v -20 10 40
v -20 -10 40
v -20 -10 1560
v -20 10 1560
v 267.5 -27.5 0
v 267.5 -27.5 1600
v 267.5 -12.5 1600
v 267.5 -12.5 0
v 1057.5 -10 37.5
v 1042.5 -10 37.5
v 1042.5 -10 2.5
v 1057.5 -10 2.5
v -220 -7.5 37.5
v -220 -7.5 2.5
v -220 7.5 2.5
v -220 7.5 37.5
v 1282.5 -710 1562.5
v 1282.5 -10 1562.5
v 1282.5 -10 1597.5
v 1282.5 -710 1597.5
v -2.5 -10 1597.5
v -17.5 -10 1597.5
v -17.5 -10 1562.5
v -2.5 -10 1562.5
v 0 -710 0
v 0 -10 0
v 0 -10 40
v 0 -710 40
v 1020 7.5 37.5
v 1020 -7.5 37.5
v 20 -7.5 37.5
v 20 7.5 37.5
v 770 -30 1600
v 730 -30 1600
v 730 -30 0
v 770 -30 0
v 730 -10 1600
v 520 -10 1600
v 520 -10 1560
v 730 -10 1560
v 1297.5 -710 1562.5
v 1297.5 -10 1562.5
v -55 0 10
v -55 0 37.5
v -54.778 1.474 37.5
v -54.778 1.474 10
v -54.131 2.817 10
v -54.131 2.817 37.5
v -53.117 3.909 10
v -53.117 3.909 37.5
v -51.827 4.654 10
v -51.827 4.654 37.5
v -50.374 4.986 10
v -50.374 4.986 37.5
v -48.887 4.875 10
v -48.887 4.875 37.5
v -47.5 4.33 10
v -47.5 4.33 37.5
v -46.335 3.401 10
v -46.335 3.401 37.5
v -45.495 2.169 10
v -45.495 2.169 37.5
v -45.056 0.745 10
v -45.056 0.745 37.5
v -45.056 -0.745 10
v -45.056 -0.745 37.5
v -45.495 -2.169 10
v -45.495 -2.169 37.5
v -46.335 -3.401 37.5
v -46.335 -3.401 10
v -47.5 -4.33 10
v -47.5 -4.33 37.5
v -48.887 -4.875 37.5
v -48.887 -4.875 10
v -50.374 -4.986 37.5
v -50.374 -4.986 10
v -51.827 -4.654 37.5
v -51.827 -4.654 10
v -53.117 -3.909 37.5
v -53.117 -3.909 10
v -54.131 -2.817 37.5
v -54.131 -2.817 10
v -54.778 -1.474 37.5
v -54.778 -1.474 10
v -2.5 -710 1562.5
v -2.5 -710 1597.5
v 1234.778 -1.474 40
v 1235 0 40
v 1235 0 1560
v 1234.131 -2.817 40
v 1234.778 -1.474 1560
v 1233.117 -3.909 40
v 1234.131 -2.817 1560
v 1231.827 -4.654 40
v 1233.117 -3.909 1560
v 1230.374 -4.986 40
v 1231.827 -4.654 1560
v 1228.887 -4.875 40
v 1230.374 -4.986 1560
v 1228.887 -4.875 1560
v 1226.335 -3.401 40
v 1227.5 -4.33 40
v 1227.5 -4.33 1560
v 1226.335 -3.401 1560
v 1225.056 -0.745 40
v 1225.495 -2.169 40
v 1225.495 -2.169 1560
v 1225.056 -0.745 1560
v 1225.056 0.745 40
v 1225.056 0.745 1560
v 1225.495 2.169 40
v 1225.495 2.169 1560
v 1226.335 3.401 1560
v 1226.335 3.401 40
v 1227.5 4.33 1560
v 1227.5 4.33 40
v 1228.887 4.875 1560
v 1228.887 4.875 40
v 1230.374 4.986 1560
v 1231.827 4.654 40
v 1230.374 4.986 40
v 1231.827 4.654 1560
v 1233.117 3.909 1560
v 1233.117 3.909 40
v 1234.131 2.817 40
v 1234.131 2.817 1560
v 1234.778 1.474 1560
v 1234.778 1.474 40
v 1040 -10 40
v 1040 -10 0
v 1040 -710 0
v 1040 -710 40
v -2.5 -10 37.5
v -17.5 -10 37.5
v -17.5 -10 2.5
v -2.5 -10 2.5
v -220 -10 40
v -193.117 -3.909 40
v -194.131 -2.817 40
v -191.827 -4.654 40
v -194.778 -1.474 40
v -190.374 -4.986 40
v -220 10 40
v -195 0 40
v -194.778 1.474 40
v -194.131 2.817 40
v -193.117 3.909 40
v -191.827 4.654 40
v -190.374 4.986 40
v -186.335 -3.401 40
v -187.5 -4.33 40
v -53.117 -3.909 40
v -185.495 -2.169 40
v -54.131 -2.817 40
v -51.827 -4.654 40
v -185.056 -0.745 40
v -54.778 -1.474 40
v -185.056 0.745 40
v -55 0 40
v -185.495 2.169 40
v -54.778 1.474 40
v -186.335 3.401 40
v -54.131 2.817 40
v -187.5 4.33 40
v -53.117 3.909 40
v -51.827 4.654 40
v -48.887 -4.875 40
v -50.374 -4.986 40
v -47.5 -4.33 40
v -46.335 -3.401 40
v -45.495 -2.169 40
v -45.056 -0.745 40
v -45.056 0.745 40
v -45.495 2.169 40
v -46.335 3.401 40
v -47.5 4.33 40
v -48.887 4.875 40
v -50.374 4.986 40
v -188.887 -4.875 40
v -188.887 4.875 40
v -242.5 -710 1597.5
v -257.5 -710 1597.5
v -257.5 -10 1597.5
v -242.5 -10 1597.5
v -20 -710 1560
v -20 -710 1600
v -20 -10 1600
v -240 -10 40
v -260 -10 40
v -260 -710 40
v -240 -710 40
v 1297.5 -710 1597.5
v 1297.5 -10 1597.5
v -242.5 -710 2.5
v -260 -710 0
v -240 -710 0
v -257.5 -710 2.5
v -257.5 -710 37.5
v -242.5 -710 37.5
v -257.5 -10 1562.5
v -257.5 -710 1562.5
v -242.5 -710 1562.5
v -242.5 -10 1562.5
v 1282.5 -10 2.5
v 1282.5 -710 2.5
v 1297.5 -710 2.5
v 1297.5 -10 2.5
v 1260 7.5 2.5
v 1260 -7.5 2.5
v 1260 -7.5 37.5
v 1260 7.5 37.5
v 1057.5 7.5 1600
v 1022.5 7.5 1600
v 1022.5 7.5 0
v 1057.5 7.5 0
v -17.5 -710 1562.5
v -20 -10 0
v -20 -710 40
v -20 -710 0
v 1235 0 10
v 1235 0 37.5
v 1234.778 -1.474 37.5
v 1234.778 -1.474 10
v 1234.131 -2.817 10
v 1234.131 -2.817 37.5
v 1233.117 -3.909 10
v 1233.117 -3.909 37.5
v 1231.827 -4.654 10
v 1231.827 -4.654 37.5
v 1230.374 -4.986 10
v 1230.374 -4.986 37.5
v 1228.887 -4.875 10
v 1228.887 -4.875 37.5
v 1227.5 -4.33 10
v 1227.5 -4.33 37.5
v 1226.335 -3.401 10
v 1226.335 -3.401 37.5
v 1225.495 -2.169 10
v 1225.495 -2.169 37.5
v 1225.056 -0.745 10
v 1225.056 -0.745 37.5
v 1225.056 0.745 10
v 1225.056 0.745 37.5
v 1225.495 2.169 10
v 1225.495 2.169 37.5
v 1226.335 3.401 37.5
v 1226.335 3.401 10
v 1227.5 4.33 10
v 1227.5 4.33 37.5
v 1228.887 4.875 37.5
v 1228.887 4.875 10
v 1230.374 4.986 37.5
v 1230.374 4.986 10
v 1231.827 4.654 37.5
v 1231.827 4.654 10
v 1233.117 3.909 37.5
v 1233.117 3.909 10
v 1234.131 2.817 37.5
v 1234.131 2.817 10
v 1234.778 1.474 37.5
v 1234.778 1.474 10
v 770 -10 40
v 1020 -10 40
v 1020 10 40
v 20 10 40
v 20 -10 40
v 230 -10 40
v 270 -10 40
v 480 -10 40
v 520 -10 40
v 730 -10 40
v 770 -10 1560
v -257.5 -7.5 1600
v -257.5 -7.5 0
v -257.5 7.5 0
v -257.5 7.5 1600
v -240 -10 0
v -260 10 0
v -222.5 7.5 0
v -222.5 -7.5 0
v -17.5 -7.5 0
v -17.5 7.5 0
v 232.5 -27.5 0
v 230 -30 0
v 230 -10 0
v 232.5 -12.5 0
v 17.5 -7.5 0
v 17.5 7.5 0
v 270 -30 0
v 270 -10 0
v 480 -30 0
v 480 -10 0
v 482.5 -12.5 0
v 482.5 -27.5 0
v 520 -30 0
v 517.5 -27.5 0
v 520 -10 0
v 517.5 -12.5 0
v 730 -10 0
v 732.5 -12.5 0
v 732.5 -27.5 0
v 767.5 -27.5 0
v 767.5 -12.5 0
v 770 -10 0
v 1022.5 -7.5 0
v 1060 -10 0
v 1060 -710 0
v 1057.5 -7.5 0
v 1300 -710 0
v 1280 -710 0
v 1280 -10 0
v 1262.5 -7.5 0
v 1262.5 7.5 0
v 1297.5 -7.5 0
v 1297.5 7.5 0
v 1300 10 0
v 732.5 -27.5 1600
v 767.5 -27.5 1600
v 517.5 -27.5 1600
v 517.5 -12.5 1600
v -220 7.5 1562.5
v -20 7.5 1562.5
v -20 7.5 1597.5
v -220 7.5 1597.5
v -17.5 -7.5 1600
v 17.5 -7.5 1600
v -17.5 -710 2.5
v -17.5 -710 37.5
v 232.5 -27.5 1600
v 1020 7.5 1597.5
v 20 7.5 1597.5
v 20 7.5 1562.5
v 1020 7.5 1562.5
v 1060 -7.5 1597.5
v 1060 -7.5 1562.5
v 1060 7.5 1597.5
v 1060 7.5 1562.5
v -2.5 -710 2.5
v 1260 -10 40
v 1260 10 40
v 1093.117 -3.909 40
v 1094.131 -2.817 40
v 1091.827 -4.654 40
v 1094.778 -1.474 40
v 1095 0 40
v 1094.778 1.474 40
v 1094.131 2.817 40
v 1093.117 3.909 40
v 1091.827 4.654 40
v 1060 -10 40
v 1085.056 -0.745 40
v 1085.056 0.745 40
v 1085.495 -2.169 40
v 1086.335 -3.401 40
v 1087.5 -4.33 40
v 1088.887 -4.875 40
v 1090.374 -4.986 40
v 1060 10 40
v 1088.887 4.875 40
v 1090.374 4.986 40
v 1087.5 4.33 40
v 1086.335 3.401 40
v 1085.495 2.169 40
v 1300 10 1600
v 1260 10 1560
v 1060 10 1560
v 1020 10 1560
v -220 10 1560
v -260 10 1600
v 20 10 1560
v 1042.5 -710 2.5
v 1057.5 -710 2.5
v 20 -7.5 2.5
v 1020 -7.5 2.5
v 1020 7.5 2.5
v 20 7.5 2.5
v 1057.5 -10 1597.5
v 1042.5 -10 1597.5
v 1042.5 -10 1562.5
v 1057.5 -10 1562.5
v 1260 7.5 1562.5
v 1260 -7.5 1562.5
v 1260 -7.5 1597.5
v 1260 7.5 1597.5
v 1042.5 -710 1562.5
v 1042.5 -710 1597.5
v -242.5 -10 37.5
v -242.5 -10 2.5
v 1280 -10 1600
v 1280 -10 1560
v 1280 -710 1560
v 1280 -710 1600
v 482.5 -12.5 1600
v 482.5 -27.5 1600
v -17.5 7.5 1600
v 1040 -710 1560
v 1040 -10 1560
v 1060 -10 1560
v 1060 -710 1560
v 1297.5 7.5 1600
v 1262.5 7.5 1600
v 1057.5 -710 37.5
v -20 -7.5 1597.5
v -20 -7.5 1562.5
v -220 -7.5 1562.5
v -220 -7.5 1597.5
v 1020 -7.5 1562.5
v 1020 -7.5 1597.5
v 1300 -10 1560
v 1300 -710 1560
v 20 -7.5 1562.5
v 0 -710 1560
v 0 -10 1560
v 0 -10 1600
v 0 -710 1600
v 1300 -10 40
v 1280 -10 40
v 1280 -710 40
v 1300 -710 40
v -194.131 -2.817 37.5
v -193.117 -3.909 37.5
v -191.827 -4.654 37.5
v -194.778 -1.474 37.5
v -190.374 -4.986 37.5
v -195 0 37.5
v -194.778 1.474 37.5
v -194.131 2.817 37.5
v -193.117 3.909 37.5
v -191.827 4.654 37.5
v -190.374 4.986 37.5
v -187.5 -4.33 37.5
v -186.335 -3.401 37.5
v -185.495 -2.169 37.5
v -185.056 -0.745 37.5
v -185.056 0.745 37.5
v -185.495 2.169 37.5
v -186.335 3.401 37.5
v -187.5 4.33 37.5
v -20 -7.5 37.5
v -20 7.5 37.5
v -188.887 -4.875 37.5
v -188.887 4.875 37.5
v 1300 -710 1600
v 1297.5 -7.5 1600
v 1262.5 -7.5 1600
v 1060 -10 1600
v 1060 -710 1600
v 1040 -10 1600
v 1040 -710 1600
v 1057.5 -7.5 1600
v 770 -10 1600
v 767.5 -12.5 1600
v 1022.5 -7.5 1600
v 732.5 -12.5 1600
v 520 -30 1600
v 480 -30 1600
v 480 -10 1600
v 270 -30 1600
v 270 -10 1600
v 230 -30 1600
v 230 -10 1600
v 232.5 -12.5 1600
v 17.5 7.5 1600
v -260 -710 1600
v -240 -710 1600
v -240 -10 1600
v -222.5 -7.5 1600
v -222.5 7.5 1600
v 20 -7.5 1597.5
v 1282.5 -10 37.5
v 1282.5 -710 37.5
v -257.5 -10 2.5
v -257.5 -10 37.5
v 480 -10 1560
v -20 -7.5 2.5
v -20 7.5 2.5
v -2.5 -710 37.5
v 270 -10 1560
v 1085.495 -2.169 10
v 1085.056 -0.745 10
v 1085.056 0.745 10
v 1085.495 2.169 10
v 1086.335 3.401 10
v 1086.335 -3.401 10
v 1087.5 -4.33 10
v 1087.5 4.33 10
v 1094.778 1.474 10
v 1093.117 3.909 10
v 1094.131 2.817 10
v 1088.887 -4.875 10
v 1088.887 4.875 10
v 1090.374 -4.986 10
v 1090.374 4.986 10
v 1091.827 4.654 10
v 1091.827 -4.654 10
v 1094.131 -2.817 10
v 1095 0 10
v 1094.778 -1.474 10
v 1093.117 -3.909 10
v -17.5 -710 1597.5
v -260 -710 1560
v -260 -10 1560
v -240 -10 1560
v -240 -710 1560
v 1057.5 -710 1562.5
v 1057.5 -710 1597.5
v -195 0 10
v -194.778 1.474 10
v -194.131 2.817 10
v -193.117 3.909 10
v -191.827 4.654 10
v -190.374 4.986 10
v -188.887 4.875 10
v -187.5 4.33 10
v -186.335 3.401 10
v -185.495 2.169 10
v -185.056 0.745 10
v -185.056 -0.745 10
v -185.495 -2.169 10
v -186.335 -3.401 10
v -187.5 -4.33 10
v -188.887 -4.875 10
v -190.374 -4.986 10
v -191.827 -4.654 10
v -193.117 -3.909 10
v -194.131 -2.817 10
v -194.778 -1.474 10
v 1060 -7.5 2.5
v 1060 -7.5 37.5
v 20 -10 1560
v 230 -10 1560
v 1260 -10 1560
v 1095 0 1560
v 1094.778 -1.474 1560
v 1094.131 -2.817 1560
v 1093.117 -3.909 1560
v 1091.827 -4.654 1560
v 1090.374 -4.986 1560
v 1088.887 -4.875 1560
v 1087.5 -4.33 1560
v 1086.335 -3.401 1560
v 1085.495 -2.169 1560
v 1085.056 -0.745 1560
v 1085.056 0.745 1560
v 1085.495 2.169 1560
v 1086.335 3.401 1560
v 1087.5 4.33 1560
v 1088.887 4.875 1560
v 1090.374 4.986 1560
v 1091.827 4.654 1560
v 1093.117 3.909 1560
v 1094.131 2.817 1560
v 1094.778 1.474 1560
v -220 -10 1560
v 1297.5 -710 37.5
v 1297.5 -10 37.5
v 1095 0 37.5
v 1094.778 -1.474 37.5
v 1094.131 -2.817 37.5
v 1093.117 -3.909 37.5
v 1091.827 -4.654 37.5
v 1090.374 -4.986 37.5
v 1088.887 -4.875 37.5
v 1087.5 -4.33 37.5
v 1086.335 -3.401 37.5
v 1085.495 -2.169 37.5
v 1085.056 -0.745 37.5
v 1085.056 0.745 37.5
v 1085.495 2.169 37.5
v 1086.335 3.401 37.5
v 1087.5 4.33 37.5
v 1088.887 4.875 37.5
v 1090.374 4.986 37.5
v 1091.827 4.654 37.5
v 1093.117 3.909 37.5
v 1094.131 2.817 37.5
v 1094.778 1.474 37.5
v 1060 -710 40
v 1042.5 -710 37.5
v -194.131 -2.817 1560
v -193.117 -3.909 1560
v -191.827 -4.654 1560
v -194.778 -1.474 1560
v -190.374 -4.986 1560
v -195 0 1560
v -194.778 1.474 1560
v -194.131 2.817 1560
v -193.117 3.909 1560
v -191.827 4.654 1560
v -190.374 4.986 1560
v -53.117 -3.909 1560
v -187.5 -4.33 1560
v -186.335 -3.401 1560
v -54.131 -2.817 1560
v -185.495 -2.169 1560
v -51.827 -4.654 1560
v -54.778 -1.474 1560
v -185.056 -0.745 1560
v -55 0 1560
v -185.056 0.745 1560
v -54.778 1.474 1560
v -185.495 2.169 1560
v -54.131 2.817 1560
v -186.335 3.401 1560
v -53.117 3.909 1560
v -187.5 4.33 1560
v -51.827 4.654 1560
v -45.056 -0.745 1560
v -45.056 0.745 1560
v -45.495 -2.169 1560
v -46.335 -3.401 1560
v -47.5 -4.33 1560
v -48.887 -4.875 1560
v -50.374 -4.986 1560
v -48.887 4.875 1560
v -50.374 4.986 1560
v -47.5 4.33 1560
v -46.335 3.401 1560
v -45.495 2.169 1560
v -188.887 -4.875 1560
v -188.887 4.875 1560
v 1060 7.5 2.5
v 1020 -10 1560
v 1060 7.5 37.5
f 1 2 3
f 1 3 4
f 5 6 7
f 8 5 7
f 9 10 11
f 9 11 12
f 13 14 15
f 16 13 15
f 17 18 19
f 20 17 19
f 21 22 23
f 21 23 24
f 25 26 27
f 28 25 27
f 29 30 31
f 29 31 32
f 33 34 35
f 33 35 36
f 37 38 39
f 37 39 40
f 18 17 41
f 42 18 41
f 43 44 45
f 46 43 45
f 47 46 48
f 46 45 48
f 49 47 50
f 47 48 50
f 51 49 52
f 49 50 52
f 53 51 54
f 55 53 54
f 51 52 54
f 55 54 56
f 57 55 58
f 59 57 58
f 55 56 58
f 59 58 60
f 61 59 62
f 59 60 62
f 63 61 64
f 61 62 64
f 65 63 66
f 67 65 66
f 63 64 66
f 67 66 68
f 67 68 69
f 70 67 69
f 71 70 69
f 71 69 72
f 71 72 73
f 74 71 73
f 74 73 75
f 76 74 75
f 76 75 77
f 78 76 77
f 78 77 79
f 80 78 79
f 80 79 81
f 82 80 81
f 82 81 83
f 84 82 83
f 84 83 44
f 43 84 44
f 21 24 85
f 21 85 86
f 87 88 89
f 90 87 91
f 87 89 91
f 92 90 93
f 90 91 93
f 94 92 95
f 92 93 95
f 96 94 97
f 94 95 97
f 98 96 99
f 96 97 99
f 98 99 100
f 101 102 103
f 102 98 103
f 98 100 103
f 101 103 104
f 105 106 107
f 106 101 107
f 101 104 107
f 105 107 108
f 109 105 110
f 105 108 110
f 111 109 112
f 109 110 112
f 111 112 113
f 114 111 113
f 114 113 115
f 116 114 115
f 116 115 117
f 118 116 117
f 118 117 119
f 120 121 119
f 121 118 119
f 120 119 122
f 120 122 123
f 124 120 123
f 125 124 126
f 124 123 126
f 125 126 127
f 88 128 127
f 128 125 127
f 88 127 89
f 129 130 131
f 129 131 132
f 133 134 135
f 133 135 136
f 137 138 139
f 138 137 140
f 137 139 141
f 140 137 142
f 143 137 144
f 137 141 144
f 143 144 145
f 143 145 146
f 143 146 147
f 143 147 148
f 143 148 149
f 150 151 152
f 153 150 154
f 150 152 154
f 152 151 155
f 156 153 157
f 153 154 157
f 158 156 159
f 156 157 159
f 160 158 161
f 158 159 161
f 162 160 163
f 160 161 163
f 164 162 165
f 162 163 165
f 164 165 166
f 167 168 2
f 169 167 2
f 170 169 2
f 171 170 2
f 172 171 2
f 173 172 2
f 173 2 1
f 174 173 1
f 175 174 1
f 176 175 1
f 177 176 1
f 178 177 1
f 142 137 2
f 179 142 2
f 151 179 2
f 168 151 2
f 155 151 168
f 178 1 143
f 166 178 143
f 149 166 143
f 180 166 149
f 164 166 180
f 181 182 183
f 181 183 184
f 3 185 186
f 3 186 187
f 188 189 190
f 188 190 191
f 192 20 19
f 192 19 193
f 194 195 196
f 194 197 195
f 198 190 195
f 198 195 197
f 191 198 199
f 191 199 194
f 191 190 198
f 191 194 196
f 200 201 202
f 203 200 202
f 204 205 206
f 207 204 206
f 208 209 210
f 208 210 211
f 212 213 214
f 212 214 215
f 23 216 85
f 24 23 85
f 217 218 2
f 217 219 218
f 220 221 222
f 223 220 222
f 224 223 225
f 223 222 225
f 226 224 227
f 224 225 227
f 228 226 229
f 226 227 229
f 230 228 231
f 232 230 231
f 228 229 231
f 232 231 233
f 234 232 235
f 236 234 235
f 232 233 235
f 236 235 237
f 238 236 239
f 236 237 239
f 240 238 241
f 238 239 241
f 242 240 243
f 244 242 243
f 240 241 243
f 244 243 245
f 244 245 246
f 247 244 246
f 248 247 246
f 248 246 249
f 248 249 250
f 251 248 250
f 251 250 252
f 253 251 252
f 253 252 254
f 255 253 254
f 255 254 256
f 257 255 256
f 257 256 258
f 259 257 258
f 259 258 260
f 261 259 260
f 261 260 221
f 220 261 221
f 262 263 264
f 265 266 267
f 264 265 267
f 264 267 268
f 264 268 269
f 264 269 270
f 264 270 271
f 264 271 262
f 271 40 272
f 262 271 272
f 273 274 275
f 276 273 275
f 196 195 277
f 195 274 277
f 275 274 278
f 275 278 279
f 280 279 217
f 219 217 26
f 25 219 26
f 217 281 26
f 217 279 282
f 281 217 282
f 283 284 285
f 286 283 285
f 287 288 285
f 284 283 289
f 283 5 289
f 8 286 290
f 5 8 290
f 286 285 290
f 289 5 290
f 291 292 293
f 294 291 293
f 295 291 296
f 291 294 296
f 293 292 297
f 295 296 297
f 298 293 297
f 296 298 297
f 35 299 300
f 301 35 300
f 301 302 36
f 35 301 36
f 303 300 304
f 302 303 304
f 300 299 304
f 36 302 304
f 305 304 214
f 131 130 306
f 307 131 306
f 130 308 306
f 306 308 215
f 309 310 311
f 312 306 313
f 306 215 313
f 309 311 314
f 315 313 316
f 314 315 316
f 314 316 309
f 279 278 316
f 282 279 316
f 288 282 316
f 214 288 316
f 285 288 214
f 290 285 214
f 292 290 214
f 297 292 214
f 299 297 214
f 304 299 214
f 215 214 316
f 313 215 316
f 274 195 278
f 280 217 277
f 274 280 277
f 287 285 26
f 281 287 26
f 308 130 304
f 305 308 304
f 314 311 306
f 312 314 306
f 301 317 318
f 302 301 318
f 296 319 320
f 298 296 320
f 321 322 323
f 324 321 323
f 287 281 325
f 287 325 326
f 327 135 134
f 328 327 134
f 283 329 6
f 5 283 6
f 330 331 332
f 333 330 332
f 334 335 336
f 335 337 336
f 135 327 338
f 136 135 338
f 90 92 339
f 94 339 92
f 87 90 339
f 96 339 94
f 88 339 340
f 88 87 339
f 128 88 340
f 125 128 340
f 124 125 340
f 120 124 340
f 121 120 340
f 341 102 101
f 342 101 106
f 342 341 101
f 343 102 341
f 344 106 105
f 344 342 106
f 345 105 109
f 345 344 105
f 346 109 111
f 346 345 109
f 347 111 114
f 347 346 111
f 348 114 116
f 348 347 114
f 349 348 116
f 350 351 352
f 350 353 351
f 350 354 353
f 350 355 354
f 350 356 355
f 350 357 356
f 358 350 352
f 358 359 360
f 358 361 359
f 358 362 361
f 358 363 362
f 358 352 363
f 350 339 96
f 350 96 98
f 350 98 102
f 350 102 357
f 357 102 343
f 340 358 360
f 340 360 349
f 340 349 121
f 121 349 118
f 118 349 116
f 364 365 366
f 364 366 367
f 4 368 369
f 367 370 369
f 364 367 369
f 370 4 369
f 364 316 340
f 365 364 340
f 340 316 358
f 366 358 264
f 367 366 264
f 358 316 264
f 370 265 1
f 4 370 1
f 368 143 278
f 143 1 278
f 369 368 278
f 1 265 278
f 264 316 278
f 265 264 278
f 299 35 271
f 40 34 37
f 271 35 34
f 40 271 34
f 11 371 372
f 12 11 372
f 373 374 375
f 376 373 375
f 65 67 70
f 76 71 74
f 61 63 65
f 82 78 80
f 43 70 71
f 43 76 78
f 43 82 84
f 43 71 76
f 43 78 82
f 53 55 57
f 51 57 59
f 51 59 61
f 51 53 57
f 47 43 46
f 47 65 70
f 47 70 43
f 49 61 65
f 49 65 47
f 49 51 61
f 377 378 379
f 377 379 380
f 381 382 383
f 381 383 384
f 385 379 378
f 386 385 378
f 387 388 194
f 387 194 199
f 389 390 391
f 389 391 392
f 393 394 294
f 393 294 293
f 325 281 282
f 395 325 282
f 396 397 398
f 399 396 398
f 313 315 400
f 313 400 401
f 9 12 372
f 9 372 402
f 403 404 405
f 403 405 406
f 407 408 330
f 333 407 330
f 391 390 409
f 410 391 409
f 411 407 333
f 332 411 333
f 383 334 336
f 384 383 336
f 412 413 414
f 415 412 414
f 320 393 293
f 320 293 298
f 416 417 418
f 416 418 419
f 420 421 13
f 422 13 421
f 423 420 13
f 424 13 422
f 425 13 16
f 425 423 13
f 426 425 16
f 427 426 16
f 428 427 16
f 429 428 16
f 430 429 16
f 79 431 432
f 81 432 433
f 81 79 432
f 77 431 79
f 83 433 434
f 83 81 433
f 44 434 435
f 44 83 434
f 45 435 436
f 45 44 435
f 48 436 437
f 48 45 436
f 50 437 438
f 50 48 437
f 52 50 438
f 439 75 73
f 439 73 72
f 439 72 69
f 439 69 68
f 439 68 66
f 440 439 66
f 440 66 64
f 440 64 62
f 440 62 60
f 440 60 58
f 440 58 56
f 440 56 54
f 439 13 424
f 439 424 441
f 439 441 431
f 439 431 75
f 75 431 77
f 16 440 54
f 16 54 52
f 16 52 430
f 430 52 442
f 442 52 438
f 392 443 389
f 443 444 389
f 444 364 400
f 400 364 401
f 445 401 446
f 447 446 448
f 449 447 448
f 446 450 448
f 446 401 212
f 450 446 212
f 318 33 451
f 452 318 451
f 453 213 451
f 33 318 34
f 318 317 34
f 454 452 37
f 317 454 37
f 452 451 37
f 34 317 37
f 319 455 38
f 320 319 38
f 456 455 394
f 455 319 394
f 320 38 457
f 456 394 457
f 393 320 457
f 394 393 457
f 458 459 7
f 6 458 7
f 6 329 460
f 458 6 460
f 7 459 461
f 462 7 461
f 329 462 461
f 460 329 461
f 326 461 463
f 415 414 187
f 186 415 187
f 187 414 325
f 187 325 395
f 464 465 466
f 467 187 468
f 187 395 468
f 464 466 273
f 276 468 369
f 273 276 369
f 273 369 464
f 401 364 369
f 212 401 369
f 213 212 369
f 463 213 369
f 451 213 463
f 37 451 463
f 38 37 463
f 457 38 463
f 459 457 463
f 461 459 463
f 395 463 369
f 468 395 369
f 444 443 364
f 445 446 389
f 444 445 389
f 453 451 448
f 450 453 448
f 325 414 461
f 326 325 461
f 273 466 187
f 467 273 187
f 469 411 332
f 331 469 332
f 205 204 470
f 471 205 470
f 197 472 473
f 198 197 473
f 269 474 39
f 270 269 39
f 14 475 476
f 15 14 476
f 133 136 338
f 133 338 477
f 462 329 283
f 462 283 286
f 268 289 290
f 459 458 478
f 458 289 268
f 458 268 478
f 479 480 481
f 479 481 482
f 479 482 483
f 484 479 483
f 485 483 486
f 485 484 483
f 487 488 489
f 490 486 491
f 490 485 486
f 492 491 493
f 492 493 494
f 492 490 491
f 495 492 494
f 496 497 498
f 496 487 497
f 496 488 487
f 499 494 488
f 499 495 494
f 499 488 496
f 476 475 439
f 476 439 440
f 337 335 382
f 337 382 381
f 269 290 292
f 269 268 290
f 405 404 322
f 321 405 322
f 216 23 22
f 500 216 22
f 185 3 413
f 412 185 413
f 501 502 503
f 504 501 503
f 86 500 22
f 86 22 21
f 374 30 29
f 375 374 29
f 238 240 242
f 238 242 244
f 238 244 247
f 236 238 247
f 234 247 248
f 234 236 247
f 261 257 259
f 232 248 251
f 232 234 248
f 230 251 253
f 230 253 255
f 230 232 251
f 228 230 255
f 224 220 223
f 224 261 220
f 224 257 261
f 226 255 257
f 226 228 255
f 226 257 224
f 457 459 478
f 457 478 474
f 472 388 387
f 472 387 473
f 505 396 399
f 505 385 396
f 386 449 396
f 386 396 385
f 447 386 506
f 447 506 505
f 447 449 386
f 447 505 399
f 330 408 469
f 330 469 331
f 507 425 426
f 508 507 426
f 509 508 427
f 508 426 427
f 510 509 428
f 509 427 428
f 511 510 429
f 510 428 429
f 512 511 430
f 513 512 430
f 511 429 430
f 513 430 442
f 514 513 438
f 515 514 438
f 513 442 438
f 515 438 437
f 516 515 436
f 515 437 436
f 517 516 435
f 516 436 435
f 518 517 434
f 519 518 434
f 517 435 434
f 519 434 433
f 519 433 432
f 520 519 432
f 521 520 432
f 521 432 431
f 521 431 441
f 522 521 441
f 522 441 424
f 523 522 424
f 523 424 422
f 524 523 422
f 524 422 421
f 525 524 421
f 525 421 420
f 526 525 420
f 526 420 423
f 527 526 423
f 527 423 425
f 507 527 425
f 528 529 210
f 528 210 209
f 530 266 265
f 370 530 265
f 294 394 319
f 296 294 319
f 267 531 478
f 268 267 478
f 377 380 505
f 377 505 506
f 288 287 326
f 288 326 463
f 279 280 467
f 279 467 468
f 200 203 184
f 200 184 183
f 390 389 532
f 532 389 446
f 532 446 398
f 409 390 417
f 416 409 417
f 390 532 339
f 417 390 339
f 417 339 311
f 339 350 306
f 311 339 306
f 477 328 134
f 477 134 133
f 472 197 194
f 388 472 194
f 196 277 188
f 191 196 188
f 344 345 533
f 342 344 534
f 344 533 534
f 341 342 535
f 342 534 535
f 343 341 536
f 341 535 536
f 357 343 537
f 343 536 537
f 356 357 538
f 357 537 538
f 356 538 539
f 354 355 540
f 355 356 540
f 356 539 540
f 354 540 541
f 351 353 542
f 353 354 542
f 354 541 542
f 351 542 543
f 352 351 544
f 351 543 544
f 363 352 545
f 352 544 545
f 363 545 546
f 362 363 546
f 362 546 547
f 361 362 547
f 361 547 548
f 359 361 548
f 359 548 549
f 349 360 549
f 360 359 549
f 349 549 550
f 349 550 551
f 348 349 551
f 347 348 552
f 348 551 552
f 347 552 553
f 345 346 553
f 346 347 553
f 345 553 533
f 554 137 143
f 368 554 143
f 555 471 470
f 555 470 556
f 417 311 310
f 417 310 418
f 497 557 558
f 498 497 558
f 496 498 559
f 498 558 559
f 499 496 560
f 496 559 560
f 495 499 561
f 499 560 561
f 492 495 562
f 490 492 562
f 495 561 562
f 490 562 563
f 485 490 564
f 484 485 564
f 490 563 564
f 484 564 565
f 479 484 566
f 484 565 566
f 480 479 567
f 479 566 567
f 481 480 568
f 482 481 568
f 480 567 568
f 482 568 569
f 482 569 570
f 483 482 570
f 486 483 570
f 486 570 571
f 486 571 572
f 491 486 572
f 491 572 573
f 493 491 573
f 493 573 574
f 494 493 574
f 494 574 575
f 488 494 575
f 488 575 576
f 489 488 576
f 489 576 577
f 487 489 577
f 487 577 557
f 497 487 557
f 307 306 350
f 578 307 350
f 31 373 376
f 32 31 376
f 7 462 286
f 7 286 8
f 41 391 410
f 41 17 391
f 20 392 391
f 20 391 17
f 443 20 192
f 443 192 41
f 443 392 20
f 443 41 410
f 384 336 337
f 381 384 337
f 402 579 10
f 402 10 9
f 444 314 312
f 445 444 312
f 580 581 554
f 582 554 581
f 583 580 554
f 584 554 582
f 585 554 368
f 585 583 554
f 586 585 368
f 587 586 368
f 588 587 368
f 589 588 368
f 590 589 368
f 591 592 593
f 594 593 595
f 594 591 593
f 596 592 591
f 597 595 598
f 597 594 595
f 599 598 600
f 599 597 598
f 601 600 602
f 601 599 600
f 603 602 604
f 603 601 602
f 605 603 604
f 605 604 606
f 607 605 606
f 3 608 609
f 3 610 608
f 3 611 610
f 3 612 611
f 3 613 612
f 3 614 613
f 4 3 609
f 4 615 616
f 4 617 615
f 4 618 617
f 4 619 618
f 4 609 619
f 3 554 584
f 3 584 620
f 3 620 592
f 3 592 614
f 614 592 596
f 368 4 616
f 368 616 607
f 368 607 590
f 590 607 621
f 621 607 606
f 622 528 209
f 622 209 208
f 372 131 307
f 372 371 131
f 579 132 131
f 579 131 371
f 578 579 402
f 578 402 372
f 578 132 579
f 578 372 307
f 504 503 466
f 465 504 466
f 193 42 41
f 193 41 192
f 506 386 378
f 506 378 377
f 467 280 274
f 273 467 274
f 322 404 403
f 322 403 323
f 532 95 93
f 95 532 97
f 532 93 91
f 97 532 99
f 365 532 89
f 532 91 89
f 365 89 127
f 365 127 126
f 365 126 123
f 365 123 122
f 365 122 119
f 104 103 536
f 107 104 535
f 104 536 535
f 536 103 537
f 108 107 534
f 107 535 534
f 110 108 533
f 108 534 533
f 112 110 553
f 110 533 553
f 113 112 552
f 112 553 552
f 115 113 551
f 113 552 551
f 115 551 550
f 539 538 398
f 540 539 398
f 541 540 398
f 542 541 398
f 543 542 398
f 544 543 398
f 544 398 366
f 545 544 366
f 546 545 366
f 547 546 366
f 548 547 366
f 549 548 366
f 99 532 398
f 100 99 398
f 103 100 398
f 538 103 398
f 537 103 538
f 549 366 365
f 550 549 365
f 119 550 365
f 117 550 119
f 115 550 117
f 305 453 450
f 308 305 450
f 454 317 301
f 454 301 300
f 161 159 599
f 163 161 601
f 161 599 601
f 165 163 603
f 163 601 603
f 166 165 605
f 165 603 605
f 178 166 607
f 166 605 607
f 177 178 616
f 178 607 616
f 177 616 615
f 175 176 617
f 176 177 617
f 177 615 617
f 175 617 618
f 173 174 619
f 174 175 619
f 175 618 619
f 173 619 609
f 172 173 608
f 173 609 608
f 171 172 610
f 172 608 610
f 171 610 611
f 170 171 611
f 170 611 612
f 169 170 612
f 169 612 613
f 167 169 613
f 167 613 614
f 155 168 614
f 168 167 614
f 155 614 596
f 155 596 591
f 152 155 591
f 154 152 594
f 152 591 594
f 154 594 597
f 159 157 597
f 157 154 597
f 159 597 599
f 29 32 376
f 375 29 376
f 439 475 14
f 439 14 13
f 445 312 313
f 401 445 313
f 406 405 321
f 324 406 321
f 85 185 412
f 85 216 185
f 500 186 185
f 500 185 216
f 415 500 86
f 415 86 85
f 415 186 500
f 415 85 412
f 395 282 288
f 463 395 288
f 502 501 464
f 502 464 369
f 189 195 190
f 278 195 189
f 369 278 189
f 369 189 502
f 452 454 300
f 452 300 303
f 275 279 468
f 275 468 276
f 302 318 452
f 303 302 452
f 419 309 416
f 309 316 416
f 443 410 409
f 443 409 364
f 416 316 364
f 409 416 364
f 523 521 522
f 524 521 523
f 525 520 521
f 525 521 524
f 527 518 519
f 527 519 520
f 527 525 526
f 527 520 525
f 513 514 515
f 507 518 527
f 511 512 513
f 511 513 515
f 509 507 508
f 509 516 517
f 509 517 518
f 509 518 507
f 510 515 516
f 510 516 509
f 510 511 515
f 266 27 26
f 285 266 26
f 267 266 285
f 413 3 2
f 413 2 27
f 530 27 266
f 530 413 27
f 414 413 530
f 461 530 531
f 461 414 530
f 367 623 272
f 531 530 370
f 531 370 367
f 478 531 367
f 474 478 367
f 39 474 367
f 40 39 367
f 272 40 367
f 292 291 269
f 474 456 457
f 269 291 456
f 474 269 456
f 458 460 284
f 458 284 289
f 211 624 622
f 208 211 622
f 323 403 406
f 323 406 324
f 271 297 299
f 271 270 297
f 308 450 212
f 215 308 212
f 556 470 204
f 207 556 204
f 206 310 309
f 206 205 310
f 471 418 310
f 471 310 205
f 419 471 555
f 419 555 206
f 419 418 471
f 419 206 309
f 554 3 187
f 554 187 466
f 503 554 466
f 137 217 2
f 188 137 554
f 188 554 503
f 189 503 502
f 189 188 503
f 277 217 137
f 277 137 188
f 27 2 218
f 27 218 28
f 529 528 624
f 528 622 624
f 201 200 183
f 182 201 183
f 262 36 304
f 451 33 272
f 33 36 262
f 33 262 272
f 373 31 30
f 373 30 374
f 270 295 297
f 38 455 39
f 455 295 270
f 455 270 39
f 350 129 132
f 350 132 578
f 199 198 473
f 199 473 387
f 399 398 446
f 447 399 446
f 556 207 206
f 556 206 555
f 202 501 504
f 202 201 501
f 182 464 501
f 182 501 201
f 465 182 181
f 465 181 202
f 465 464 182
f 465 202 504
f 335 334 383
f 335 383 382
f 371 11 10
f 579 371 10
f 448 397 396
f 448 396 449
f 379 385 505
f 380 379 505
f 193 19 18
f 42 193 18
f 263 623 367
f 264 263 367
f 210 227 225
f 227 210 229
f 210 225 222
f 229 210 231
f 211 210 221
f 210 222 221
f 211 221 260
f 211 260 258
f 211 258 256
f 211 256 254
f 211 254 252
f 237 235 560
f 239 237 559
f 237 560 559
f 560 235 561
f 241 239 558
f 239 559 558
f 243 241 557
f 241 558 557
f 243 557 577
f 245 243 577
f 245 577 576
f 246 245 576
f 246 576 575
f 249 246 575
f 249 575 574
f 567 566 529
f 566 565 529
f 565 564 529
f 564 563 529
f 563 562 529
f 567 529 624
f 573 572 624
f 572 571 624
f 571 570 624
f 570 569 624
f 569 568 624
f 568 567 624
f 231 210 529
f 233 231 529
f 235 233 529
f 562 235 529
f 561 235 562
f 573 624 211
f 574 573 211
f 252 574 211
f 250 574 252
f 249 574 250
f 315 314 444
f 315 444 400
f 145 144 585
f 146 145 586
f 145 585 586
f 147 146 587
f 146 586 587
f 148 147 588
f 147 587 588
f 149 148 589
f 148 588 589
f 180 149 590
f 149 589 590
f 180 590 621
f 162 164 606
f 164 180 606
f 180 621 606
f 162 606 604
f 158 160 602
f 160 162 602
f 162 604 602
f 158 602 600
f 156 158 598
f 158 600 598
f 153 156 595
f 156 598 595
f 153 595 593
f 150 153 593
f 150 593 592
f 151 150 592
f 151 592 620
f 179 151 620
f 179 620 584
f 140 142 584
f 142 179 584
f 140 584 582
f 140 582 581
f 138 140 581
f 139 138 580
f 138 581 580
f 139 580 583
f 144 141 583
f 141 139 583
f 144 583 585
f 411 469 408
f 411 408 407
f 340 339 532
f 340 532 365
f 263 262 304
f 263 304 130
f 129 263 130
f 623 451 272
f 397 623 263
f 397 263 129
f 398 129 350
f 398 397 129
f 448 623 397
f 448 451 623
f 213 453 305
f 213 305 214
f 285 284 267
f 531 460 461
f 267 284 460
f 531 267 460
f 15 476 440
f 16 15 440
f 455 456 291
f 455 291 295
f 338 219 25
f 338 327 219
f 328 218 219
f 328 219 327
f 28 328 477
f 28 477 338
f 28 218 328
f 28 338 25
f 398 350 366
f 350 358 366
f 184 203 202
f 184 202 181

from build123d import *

# Parameters (mm, degrees)
SKETCH1_W            = 40
SKETCH1_H            = 20
SKETCH1_W_2          = 35
SKETCH1_H_2          = 15
BOSS_EXTRUDE1_DEPTH  = 1600
SKETCH2_W            = 40
SKETCH2_H            = 20
SKETCH2_W_2          = 35
SKETCH2_H_2          = 15
BOSS_EXTRUDE3_DEPTH  = 1000
SKETCH3_W            = 40
SKETCH3_H            = 20
SKETCH3_W_2          = 35
SKETCH3_H_2          = 15
BOSS_EXTRUDE4_DEPTH  = 1600
SKETCH4_W            = 20
SKETCH4_H            = 40
SKETCH4_W_2          = 15
SKETCH4_H_2          = 35
BOSS_EXTRUDE5_DEPTH  = 700
SKETCH5_W            = 40
SKETCH5_H            = 20
SKETCH5_W_2          = 35
SKETCH5_H_2          = 15
BOSS_EXTRUDE6_DEPTH  = 1600
SKETCH7_W            = 40
SKETCH7_H            = 20
SKETCH7_W_2          = 35
SKETCH7_H_2          = 15
BOSS_EXTRUDE7_DEPTH  = 200
SKETCH10_W           = 40
SKETCH10_H           = 20
SKETCH10_W_2         = 35
SKETCH10_H_2         = 15
BOSS_EXTRUDE9_DEPTH  = 200
SKETCH11_W           = 40
SKETCH11_H           = 20
SKETCH11_W_2         = 35
SKETCH11_H_2         = 15
BOSS_EXTRUDE10_DEPTH = 1600
SKETCH12_W           = 20
SKETCH12_H           = 40
SKETCH12_W_2         = 15
SKETCH12_H_2         = 35
BOSS_EXTRUDE11_DEPTH = 700
SKETCH14_R           = 5
BOSS_EXTRUDE13_DEPTH = 1550


with BuildPart() as part:
    # Sketch1 → Boss-Extrude1 (new body)
    with BuildSketch(Plane.XY):
        Rectangle(SKETCH1_W, SKETCH1_H)
        Rectangle(SKETCH1_W_2, SKETCH1_H_2, mode=Mode.SUBTRACT)
    extrude(amount=BOSS_EXTRUDE1_DEPTH)

    # Sketch2 → Boss-Extrude3 (add)
    # profile 1 of 2: a face of its own
    with BuildSketch(Plane(origin=(20, 0, 0), x_dir=(0, 0, -1), z_dir=(1, 0, 0))):
        with Locations((-1580, 0)):
            Rectangle(SKETCH2_W, SKETCH2_H)
        with Locations((-1580, 0)):
            Rectangle(SKETCH2_W_2, SKETCH2_H_2, mode=Mode.SUBTRACT)
    # profile 2 of 2: a face of its own
    with BuildSketch(Plane(origin=(20, 0, 0), x_dir=(0, 0, -1), z_dir=(1, 0, 0))):
        with Locations((-20, 0)):
            Rectangle(SKETCH2_W, SKETCH2_H)
        with Locations((-20, 0)):
            Rectangle(SKETCH2_W_2, SKETCH2_H_2, mode=Mode.SUBTRACT)
    extrude(amount=BOSS_EXTRUDE3_DEPTH)

    # Sketch3 → Boss-Extrude4 (add)
    with BuildSketch(Plane.XY.offset(1600)):
        with Locations((1040, 0)):
            Rectangle(SKETCH3_W, SKETCH3_H)
        with Locations((1040, 0)):
            Rectangle(SKETCH3_W_2, SKETCH3_H_2, mode=Mode.SUBTRACT)
    extrude(amount=-BOSS_EXTRUDE4_DEPTH)

    # Sketch4 → Boss-Extrude5 (add)
    # profile 1 of 4: a face of its own
    with BuildSketch(Plane.XZ.offset(10)):
        with Locations((1050, 1580)):
            Rectangle(SKETCH4_W, SKETCH4_H)
        with Locations((1050, 1580)):
            Rectangle(SKETCH4_W_2, SKETCH4_H_2, mode=Mode.SUBTRACT)
    # profile 2 of 4: a face of its own
    with BuildSketch(Plane.XZ.offset(10)):
        with Locations((1050, 20)):
            Rectangle(SKETCH4_W, SKETCH4_H)
        with Locations((1050, 20)):
            Rectangle(SKETCH4_W_2, SKETCH4_H_2, mode=Mode.SUBTRACT)
    # profile 3 of 4: a face of its own
    with BuildSketch(Plane.XZ.offset(10)):
        with Locations((-10, 20)):
            Rectangle(SKETCH4_W, SKETCH4_H)
        with Locations((-10, 20)):
            Rectangle(SKETCH4_W_2, SKETCH4_H_2, mode=Mode.SUBTRACT)
    # profile 4 of 4: a face of its own
    with BuildSketch(Plane.XZ.offset(10)):
        with Locations((-10, 1580)):
            Rectangle(SKETCH4_W, SKETCH4_H)
        with Locations((-10, 1580)):
            Rectangle(SKETCH4_W_2, SKETCH4_H_2, mode=Mode.SUBTRACT)
    extrude(amount=BOSS_EXTRUDE5_DEPTH)

    # Sketch5 → Boss-Extrude6 (add)
    # profile 1 of 3: a face of its own
    with BuildSketch(Plane.XY.offset(1600)):
        with Locations((250, -20)):
            Rectangle(SKETCH5_W, SKETCH5_H)
        with Locations((250, -20)):
            Rectangle(SKETCH5_W_2, SKETCH5_H_2, mode=Mode.SUBTRACT)
    # profile 2 of 3: a face of its own
    with BuildSketch(Plane.XY.offset(1600)):
        with Locations((500, -20)):
            Rectangle(SKETCH5_W, SKETCH5_H)
        with Locations((500, -20)):
            Rectangle(SKETCH5_W_2, SKETCH5_H_2, mode=Mode.SUBTRACT)
    # profile 3 of 3: a face of its own
    with BuildSketch(Plane.XY.offset(1600)):
        with Locations((750, -20)):
            Rectangle(SKETCH5_W, SKETCH5_H)
        with Locations((750, -20)):
            Rectangle(SKETCH5_W_2, SKETCH5_H_2, mode=Mode.SUBTRACT)
    extrude(amount=-BOSS_EXTRUDE6_DEPTH)

    # Sketch7 → Boss-Extrude7 (add)
    # profile 1 of 2: a face of its own
    with BuildSketch(Plane(origin=(1060, 0, 0), x_dir=(0, 0, -1), z_dir=(1, 0, 0))):
        with Locations((-1580, 0)):
            Rectangle(SKETCH7_W, SKETCH7_H)
        with Locations((-1580, 0)):
            Rectangle(SKETCH7_W_2, SKETCH7_H_2, mode=Mode.SUBTRACT)
    # profile 2 of 2: a face of its own
    with BuildSketch(Plane(origin=(1060, 0, 0), x_dir=(0, 0, -1), z_dir=(1, 0, 0))):
        with Locations((-20, 0)):
            Rectangle(SKETCH7_W, SKETCH7_H)
        with Locations((-20, 0)):
            Rectangle(SKETCH7_W_2, SKETCH7_H_2, mode=Mode.SUBTRACT)
    extrude(amount=BOSS_EXTRUDE7_DEPTH)

    # Sketch10 → Boss-Extrude9 (add)
    # profile 1 of 2: a face of its own
    with BuildSketch(Plane.ZY.offset(20)):
        with Locations((20, 0)):
            Rectangle(SKETCH10_W, SKETCH10_H)
        with Locations((20, 0)):
            Rectangle(SKETCH10_W_2, SKETCH10_H_2, mode=Mode.SUBTRACT)
    # profile 2 of 2: a face of its own
    with BuildSketch(Plane.ZY.offset(20)):
        with Locations((1580, 0)):
            Rectangle(SKETCH10_W, SKETCH10_H)
        with Locations((1580, 0)):
            Rectangle(SKETCH10_W_2, SKETCH10_H_2, mode=Mode.SUBTRACT)
    extrude(amount=BOSS_EXTRUDE9_DEPTH)

    # Sketch11 → Boss-Extrude10 (add)
    # profile 1 of 2: a face of its own
    with BuildSketch(Plane(origin=(0, 0, 0), x_dir=(-1, 0, 0), z_dir=(0, 0, -1))):
        with Locations((240, 0)):
            Rectangle(SKETCH11_W, SKETCH11_H)
        with Locations((240, 0)):
            Rectangle(SKETCH11_W_2, SKETCH11_H_2, mode=Mode.SUBTRACT)
    # profile 2 of 2: a face of its own
    with BuildSketch(Plane(origin=(0, 0, 0), x_dir=(-1, 0, 0), z_dir=(0, 0, -1))):
        with Locations((-1280, 0)):
            Rectangle(SKETCH11_W, SKETCH11_H)
        with Locations((-1280, 0)):
            Rectangle(SKETCH11_W_2, SKETCH11_H_2, mode=Mode.SUBTRACT)
    extrude(amount=-BOSS_EXTRUDE10_DEPTH)

    # Sketch12 → Boss-Extrude11 (add)
    # profile 1 of 4: a face of its own
    with BuildSketch(Plane.XZ.offset(10)):
        with Locations((1290, 20)):
            Rectangle(SKETCH12_W, SKETCH12_H)
        with Locations((1290, 20)):
            Rectangle(SKETCH12_W_2, SKETCH12_H_2, mode=Mode.SUBTRACT)
    # profile 2 of 4: a face of its own
    with BuildSketch(Plane.XZ.offset(10)):
        with Locations((-250, 20)):
            Rectangle(SKETCH12_W, SKETCH12_H)
        with Locations((-250, 20)):
            Rectangle(SKETCH12_W_2, SKETCH12_H_2, mode=Mode.SUBTRACT)
    # profile 3 of 4: a face of its own
    with BuildSketch(Plane.XZ.offset(10)):
        with Locations((1290, 1580)):
            Rectangle(SKETCH12_W, SKETCH12_H)
        with Locations((1290, 1580)):
            Rectangle(SKETCH12_W_2, SKETCH12_H_2, mode=Mode.SUBTRACT)
    # profile 4 of 4: a face of its own
    with BuildSketch(Plane.XZ.offset(10)):
        with Locations((-250, 1580)):
            Rectangle(SKETCH12_W, SKETCH12_H)
        with Locations((-250, 1580)):
            Rectangle(SKETCH12_W_2, SKETCH12_H_2, mode=Mode.SUBTRACT)
    extrude(amount=BOSS_EXTRUDE11_DEPTH)

    # Sketch14 → Boss-Extrude13 (add)
    with BuildSketch(Plane(origin=(0, 0, 1560), x_dir=(-1, 0, 0), z_dir=(0, 0, -1))):
        with Locations(Location((-1230, 0, 0), (0, 0, 180))):
            Circle(SKETCH14_R)
        with Locations(Location((-1090, 0, 0), (0, 0, 180))):
            Circle(SKETCH14_R)
        with Locations((50, 0)):
            Circle(SKETCH14_R)
        with Locations((190, 0)):
            Circle(SKETCH14_R)
    extrude(amount=BOSS_EXTRUDE13_DEPTH)


solid = part.part
